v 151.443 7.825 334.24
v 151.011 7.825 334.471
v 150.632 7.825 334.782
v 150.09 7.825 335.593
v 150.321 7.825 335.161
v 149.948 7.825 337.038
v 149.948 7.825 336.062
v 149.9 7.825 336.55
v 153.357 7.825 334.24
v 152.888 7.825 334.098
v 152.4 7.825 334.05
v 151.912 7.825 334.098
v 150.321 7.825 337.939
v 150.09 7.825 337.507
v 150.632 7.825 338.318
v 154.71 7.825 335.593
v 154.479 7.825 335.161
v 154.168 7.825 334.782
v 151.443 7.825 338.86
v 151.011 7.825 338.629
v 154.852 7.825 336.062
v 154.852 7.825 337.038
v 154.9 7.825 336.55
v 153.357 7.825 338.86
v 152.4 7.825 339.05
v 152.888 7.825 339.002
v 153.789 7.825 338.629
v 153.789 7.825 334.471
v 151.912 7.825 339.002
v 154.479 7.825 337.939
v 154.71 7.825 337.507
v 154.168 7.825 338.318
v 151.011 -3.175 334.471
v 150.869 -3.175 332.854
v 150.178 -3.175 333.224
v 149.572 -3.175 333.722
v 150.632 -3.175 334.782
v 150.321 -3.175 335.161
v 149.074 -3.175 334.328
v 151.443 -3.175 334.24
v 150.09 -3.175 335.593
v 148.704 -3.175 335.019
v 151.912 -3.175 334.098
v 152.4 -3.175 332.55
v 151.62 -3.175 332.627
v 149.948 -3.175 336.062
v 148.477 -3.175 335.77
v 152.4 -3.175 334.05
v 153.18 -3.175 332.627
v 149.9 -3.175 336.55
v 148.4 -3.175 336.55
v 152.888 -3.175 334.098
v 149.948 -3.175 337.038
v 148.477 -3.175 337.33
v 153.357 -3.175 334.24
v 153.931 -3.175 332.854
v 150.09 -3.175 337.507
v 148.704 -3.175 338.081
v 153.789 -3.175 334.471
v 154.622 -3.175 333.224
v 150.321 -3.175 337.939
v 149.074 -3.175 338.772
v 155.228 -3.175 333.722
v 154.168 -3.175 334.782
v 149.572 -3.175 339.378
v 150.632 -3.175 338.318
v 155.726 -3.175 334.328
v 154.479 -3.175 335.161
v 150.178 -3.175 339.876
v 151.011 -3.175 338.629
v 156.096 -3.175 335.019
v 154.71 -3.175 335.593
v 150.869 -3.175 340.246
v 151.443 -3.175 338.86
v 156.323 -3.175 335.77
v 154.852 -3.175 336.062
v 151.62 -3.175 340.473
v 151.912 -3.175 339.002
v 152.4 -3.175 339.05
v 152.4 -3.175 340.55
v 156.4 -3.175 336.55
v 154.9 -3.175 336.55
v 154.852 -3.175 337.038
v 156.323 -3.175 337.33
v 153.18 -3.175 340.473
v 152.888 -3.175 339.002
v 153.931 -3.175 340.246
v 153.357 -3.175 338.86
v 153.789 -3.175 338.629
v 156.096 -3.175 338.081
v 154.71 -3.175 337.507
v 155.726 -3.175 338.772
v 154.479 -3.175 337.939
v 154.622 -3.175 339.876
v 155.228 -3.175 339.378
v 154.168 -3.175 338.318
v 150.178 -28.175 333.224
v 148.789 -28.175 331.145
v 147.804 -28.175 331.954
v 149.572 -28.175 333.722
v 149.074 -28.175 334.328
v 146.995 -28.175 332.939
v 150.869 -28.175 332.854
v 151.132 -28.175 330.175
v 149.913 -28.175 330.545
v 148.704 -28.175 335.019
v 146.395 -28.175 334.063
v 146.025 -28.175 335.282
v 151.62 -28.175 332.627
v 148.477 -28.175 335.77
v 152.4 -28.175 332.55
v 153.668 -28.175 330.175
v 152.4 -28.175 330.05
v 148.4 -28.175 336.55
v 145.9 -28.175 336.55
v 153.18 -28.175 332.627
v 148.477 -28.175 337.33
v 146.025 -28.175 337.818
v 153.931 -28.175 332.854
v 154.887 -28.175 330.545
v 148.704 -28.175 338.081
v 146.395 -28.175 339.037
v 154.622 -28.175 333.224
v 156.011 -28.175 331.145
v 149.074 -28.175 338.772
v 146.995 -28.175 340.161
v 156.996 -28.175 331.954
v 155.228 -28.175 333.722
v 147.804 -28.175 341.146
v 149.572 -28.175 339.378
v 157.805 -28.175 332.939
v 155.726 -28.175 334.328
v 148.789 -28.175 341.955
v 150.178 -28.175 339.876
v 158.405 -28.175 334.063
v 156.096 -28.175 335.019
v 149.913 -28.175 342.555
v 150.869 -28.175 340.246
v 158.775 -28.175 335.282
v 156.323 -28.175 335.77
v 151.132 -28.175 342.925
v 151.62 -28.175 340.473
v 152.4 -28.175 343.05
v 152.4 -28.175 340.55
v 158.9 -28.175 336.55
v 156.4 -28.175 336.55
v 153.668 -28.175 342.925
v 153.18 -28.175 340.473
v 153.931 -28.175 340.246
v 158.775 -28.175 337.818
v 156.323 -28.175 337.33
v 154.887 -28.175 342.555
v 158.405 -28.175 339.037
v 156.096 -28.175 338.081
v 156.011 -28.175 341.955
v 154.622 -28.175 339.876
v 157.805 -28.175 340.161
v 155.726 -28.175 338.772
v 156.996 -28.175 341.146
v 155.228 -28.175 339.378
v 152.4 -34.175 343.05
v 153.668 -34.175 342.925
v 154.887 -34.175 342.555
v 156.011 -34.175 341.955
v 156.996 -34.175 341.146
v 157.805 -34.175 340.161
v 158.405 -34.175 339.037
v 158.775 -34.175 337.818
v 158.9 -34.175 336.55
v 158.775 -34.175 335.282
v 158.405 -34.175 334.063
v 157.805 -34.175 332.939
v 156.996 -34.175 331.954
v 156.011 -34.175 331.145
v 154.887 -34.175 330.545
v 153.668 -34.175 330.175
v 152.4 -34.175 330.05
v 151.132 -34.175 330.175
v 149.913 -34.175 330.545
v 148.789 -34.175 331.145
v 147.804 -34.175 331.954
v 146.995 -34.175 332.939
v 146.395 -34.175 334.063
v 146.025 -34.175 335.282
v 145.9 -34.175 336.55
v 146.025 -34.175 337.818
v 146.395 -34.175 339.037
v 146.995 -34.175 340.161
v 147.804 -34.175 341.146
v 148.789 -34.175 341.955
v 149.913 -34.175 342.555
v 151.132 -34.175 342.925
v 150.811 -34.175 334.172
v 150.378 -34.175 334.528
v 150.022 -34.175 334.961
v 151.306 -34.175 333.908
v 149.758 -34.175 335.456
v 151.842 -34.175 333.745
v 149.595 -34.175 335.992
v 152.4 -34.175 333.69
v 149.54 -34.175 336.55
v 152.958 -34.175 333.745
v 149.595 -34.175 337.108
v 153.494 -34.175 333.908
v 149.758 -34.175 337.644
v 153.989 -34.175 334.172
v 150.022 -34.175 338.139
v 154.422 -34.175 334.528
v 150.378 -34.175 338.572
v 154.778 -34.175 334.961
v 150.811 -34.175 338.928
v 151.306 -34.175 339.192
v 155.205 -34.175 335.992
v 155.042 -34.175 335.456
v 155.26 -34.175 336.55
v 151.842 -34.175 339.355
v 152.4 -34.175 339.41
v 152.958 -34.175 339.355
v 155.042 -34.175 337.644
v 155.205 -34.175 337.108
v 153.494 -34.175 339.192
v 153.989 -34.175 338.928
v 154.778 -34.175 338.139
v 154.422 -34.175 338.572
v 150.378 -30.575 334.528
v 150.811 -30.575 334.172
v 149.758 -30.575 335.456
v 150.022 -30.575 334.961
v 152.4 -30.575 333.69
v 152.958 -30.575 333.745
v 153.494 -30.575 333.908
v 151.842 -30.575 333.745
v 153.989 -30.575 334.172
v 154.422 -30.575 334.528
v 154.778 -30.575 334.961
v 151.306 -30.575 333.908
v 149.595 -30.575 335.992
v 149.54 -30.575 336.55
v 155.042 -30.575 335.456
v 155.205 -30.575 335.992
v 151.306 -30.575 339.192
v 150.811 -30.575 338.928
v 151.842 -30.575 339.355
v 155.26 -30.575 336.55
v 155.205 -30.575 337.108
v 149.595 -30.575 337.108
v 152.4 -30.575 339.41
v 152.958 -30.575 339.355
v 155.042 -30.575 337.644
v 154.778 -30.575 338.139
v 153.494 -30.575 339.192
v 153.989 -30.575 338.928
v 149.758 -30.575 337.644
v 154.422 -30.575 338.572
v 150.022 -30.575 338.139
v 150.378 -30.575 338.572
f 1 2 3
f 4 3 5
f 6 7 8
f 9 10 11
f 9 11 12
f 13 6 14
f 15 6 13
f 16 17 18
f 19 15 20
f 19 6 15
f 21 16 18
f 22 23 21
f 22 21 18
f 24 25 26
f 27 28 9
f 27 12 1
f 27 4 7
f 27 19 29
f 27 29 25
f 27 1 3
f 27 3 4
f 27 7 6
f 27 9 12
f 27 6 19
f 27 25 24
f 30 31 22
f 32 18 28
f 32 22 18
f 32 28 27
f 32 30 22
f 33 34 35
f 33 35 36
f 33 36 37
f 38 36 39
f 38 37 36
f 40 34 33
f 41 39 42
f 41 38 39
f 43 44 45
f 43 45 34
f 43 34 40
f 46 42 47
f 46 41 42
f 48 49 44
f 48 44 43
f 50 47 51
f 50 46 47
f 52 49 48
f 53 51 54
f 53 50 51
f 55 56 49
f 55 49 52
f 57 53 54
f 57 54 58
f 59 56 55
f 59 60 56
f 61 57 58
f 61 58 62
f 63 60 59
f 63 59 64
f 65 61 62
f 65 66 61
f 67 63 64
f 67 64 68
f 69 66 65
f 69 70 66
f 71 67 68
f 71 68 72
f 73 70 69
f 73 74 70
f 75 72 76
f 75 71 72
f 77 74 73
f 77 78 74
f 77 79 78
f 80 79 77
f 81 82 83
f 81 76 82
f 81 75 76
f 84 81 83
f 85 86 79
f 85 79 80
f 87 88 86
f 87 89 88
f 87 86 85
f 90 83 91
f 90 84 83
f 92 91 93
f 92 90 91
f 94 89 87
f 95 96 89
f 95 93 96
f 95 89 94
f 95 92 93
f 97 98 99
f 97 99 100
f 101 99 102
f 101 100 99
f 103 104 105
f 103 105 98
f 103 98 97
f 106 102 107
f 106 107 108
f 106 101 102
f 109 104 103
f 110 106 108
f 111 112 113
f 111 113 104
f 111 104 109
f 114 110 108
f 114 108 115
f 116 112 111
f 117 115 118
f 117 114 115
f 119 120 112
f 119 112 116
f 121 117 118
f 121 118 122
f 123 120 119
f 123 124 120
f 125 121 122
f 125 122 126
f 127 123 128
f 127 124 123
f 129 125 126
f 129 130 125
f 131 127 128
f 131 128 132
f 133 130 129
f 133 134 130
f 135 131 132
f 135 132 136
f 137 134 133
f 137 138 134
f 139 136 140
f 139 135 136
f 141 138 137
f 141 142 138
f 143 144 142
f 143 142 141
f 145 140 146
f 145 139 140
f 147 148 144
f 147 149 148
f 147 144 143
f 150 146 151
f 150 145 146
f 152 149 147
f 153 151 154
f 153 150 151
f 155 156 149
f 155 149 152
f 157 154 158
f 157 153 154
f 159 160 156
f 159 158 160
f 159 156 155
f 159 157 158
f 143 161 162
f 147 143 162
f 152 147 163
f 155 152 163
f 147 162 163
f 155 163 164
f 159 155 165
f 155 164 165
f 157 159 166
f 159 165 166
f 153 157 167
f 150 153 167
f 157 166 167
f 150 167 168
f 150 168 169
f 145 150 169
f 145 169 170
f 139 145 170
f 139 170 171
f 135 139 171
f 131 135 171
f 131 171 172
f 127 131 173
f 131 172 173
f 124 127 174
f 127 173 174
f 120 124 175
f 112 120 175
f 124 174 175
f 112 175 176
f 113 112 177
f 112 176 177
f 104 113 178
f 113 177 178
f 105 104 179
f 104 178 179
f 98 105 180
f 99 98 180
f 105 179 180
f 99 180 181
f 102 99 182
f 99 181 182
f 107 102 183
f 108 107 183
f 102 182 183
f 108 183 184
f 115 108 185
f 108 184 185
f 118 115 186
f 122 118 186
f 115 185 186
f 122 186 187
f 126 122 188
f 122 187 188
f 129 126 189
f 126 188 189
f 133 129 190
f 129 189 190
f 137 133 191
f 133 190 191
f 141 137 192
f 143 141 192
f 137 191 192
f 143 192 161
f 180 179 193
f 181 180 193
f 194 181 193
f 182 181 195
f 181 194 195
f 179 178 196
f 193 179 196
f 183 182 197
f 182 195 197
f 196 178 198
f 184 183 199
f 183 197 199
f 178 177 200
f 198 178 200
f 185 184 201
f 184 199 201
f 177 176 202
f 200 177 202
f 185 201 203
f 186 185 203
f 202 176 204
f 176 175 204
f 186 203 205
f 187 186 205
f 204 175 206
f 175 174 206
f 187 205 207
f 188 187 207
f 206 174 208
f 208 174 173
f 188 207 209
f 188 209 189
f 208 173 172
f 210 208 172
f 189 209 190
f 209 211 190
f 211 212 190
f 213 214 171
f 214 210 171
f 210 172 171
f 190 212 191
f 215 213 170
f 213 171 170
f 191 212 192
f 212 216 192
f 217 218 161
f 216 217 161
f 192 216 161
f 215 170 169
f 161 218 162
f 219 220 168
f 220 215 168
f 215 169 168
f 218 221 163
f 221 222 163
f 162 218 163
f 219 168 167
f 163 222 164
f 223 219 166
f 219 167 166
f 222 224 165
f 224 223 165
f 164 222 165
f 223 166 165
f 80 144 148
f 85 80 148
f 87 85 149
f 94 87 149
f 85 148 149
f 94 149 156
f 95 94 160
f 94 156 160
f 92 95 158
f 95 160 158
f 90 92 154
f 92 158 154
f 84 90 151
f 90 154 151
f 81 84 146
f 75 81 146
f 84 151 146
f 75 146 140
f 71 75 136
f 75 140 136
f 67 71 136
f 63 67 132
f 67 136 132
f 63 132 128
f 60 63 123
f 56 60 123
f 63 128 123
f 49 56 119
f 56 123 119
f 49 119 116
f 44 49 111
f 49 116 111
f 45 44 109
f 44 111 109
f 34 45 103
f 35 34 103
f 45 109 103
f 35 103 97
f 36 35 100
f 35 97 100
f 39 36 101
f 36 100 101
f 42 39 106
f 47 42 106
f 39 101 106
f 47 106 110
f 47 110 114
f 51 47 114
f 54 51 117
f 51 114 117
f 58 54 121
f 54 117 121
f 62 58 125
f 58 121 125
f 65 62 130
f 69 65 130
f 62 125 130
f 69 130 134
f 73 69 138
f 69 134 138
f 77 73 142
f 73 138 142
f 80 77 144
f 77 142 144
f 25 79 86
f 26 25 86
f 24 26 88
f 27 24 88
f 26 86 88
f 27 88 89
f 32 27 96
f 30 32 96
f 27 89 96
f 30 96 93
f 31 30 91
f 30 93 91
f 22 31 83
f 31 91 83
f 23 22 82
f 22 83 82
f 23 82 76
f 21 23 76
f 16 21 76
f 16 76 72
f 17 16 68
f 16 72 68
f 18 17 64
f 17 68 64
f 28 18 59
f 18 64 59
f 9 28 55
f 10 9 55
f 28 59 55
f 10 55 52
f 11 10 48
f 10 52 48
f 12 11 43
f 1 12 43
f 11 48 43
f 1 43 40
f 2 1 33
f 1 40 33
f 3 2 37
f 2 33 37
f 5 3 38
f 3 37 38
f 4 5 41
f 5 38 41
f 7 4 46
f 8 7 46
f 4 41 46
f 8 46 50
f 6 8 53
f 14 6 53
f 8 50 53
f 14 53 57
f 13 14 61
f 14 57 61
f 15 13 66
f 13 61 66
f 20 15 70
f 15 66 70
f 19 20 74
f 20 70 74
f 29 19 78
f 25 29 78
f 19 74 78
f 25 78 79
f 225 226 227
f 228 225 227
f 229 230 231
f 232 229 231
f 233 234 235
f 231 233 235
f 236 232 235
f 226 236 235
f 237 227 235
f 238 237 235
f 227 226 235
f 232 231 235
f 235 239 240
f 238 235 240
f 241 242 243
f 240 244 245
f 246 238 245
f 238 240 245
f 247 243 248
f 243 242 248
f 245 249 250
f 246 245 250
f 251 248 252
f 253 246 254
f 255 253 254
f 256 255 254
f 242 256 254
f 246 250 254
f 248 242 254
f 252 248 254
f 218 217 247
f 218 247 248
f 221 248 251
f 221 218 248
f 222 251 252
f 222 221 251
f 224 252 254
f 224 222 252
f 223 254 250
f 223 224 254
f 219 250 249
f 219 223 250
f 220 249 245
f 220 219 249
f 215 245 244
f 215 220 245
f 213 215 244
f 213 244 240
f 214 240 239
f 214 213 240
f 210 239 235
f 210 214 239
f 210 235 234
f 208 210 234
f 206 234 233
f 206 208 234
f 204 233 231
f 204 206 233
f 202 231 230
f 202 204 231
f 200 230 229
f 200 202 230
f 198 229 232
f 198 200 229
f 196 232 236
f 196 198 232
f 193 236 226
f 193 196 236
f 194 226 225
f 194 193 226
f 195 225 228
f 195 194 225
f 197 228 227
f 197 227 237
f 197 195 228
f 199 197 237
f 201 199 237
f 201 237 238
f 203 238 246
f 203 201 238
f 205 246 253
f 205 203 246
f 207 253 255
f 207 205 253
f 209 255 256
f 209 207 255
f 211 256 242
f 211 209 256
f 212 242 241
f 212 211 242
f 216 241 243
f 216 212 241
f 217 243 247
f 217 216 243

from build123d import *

# Parameters (mm, degrees)
ROSCA_START  = -3.175
CROQUIS1_R   = 2.5
ROSCA_DEPTH  = 11
HOMBRO_START = -28.175
CROQUIS2_R   = 4
HOMBRO_DEPTH = 25
CABEZA_START = -34.175
CROQUIS3_R   = 6.5
CABEZA_DEPTH = 6
ALLEN_START  = -34.175
CROQUIS4_R   = 2.86
ALLEN_DEPTH  = 3.6


with BuildPart() as part:
    # Croquis1 → Rosca (new body)
    with BuildSketch(Plane(origin=(0, 0, 0), x_dir=(1, 0, 0), z_dir=(0, 1, 0)).offset(ROSCA_START)):
        with Locations(Location((152.4, -336.55, 0), (0, 0, 270))):
            Circle(CROQUIS1_R)
    extrude(amount=ROSCA_DEPTH)

    # Croquis2 → Hombro (add)
    with BuildSketch(Plane(origin=(0, 0, 0), x_dir=(1, 0, 0), z_dir=(0, 1, 0)).offset(HOMBRO_START)):
        with Locations(Location((152.4, -336.55, 0), (0, 0, 270))):
            Circle(CROQUIS2_R)
    extrude(amount=HOMBRO_DEPTH)

    # Croquis3 → Cabeza (add)
    with BuildSketch(Plane(origin=(0, 0, 0), x_dir=(1, 0, 0), z_dir=(0, 1, 0)).offset(CABEZA_START)):
        with Locations(Location((152.4, -336.55, 0), (0, 0, 270))):
            Circle(CROQUIS3_R)
    extrude(amount=CABEZA_DEPTH)

    # Croquis4 → Allen (cut)
    with BuildSketch(Plane(origin=(0, 0, 0), x_dir=(1, 0, 0), z_dir=(0, 1, 0)).offset(ALLEN_START)):
        with Locations(Location((152.4, -336.55, 0), (0, 0, 270))):
            Circle(CROQUIS4_R)
    extrude(amount=ALLEN_DEPTH, mode=Mode.SUBTRACT)


solid = part.part
